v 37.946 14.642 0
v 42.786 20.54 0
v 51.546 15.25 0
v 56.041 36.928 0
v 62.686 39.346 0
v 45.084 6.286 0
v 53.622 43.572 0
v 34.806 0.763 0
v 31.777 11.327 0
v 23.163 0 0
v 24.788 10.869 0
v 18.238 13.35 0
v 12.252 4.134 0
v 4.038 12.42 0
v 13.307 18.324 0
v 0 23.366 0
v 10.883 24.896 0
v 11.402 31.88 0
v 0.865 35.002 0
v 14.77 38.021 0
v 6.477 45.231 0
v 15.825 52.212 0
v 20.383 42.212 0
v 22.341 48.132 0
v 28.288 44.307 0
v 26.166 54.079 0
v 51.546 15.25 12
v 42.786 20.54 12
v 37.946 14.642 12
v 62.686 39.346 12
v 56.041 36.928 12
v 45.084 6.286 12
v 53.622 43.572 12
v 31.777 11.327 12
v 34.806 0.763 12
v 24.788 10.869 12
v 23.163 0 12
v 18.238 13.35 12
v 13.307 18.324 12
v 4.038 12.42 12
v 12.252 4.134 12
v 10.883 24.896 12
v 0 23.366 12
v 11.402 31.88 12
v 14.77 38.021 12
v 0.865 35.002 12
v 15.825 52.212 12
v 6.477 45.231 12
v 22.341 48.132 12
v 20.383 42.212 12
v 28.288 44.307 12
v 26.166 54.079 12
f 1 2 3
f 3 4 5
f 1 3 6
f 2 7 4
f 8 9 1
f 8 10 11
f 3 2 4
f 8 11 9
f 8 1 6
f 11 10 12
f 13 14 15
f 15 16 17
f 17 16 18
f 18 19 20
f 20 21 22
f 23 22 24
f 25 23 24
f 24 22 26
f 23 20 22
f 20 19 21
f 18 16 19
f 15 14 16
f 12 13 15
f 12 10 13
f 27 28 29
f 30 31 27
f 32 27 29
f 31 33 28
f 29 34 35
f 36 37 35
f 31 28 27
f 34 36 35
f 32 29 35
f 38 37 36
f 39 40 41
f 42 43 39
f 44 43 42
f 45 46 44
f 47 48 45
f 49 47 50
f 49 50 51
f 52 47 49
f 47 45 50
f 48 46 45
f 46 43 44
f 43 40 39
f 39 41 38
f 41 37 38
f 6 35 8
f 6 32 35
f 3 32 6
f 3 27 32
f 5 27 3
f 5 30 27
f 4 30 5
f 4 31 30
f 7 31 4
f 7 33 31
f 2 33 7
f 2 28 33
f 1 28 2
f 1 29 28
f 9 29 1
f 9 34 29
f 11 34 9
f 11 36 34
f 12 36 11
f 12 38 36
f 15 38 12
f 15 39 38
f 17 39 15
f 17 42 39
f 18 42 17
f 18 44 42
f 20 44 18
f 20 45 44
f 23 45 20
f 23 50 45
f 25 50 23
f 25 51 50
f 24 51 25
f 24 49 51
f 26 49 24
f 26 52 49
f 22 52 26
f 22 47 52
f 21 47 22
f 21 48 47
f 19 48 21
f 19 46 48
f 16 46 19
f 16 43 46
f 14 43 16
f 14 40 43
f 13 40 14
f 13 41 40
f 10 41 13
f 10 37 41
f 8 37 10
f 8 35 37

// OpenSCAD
$fn = 32;

// ----------------------------------------------------------------------
// Hook plate: curl radius 22 mm over 245 degrees, 10 mm thick band
// ----------------------------------------------------------------------

// --- parameters (mm) ---
profile_height = 12;      // extrusion height
profile_points = 26;      // points of the closed outline

profile = [[22.341, 48.132], [26.166, 54.079], [15.825, 52.212], [6.477, 45.231], [0.865, 35.002], [0, 23.366], [4.038, 12.42], [12.252, 4.134], [23.163, 0], [34.806, 0.763], [45.084, 6.286], [51.546, 15.25], [62.686, 39.346], [56.041, 36.928], [53.622, 43.572], [42.786, 20.54], [37.946, 14.642], [31.777, 11.327], [24.788, 10.869], [18.238, 13.35], [13.307, 18.324], [10.883, 24.896], [11.402, 31.88], [14.77, 38.021], [20.383, 42.212], [28.288, 44.307]];  // single closed polygon, 26 points, counter clockwise

// --- the one profile operation ---
linear_extrude(height = profile_height) polygon(points = profile);
